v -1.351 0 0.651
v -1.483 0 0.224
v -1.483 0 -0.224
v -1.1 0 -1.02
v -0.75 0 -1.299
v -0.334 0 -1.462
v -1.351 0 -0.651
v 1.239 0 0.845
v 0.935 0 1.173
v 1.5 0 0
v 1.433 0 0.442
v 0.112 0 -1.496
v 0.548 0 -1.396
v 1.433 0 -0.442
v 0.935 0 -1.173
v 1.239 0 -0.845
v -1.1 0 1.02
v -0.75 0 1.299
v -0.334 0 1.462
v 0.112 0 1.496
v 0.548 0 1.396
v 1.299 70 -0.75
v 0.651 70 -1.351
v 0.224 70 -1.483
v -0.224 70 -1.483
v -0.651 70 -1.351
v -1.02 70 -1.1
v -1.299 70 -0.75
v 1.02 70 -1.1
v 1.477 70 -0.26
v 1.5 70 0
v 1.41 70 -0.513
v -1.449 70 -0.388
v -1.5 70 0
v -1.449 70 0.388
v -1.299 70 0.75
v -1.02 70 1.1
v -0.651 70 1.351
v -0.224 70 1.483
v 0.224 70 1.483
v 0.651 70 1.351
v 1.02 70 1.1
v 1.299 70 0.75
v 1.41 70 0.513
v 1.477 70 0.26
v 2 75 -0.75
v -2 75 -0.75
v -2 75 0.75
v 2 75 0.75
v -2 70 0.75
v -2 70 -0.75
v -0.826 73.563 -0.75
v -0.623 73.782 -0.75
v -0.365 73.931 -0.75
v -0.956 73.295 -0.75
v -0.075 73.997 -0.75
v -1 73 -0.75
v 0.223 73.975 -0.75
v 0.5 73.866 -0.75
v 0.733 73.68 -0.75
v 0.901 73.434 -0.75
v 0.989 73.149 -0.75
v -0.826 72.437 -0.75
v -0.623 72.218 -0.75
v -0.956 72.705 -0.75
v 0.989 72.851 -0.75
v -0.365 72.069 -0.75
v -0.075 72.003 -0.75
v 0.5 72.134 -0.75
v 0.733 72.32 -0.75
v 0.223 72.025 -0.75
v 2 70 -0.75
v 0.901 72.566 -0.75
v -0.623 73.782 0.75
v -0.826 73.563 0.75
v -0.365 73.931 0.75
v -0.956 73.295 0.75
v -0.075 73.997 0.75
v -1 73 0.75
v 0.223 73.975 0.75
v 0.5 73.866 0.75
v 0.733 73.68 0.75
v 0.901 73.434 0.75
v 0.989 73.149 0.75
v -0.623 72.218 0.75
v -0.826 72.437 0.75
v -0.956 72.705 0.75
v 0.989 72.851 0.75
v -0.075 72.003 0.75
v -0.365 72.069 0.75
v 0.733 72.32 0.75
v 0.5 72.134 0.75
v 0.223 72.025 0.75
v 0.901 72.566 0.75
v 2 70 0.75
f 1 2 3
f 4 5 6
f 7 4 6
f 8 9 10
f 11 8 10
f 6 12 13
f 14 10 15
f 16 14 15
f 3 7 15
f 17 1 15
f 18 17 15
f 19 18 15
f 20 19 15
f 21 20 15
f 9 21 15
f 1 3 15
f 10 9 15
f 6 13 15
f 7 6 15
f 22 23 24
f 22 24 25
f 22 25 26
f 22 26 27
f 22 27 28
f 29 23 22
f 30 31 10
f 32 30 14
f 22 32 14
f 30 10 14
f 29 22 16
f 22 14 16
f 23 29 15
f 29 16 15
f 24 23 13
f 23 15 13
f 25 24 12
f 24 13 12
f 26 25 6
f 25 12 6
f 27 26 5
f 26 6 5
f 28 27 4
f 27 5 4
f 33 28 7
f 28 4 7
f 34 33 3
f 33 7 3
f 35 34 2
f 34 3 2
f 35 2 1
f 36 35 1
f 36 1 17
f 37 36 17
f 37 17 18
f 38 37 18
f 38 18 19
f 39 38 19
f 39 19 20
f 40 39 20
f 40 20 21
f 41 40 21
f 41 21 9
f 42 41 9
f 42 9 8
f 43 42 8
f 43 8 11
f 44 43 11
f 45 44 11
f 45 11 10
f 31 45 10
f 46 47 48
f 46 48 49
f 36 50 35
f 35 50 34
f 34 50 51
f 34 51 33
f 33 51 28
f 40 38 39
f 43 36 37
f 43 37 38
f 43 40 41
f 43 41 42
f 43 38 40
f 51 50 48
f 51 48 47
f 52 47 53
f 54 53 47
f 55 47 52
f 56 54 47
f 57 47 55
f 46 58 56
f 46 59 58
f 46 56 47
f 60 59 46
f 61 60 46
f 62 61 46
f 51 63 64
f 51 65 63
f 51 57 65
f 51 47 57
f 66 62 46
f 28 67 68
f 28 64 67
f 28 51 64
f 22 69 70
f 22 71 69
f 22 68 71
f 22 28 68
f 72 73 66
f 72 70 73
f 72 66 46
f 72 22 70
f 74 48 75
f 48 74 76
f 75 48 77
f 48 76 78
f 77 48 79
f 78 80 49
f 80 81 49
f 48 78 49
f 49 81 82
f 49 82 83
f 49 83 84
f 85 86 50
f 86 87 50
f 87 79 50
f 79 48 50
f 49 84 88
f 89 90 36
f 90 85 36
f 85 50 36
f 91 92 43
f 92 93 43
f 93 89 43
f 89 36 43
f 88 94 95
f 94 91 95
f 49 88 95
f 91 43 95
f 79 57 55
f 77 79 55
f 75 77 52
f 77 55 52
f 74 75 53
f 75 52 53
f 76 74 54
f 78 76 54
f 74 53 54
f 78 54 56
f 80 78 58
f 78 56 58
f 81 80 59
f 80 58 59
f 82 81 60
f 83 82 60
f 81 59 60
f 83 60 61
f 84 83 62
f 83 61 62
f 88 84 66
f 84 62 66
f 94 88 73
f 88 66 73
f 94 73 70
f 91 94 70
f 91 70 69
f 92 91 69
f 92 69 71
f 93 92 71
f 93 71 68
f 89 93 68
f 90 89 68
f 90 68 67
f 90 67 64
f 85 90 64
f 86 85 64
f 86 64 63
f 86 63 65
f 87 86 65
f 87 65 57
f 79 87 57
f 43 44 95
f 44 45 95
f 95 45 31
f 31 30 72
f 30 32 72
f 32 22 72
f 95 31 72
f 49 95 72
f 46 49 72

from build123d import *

# Parameters (mm, degrees)
SKETCH1_R           = 1.5
BOSS_EXTRUDE1_DEPTH = 70
SKETCH2_W           = 4
SKETCH2_H           = 1.5
BOSS_EXTRUDE2_DEPTH = 5
SKETCH3_R           = 1
CUT_EXTRUDE1_DEPTH  = 3.25


with BuildPart() as part:
    # Sketch1 → Boss-Extrude1 (new body)
    with BuildSketch(Plane(origin=(0, 0, 0), x_dir=(1, 0, 0), z_dir=(0, 1, 0))):
        Circle(SKETCH1_R)
    extrude(amount=BOSS_EXTRUDE1_DEPTH)

    # Sketch2 → Boss-Extrude2 (add)
    with BuildSketch(Plane(origin=(0, 70, 0), x_dir=(1, 0, 0), z_dir=(0, 1, 0))):
        Rectangle(SKETCH2_W, SKETCH2_H)
    extrude(amount=BOSS_EXTRUDE2_DEPTH)

    # Sketch3 → Cut-Extrude1 (cut, through all)
    with BuildSketch(Plane(origin=(0, 0, -0.75), x_dir=(-1, 0, 0), z_dir=(0, 0, -1))):
        with Locations((0, 73)):
            Circle(SKETCH3_R)
    extrude(amount=-CUT_EXTRUDE1_DEPTH, mode=Mode.SUBTRACT)


solid = part.part
